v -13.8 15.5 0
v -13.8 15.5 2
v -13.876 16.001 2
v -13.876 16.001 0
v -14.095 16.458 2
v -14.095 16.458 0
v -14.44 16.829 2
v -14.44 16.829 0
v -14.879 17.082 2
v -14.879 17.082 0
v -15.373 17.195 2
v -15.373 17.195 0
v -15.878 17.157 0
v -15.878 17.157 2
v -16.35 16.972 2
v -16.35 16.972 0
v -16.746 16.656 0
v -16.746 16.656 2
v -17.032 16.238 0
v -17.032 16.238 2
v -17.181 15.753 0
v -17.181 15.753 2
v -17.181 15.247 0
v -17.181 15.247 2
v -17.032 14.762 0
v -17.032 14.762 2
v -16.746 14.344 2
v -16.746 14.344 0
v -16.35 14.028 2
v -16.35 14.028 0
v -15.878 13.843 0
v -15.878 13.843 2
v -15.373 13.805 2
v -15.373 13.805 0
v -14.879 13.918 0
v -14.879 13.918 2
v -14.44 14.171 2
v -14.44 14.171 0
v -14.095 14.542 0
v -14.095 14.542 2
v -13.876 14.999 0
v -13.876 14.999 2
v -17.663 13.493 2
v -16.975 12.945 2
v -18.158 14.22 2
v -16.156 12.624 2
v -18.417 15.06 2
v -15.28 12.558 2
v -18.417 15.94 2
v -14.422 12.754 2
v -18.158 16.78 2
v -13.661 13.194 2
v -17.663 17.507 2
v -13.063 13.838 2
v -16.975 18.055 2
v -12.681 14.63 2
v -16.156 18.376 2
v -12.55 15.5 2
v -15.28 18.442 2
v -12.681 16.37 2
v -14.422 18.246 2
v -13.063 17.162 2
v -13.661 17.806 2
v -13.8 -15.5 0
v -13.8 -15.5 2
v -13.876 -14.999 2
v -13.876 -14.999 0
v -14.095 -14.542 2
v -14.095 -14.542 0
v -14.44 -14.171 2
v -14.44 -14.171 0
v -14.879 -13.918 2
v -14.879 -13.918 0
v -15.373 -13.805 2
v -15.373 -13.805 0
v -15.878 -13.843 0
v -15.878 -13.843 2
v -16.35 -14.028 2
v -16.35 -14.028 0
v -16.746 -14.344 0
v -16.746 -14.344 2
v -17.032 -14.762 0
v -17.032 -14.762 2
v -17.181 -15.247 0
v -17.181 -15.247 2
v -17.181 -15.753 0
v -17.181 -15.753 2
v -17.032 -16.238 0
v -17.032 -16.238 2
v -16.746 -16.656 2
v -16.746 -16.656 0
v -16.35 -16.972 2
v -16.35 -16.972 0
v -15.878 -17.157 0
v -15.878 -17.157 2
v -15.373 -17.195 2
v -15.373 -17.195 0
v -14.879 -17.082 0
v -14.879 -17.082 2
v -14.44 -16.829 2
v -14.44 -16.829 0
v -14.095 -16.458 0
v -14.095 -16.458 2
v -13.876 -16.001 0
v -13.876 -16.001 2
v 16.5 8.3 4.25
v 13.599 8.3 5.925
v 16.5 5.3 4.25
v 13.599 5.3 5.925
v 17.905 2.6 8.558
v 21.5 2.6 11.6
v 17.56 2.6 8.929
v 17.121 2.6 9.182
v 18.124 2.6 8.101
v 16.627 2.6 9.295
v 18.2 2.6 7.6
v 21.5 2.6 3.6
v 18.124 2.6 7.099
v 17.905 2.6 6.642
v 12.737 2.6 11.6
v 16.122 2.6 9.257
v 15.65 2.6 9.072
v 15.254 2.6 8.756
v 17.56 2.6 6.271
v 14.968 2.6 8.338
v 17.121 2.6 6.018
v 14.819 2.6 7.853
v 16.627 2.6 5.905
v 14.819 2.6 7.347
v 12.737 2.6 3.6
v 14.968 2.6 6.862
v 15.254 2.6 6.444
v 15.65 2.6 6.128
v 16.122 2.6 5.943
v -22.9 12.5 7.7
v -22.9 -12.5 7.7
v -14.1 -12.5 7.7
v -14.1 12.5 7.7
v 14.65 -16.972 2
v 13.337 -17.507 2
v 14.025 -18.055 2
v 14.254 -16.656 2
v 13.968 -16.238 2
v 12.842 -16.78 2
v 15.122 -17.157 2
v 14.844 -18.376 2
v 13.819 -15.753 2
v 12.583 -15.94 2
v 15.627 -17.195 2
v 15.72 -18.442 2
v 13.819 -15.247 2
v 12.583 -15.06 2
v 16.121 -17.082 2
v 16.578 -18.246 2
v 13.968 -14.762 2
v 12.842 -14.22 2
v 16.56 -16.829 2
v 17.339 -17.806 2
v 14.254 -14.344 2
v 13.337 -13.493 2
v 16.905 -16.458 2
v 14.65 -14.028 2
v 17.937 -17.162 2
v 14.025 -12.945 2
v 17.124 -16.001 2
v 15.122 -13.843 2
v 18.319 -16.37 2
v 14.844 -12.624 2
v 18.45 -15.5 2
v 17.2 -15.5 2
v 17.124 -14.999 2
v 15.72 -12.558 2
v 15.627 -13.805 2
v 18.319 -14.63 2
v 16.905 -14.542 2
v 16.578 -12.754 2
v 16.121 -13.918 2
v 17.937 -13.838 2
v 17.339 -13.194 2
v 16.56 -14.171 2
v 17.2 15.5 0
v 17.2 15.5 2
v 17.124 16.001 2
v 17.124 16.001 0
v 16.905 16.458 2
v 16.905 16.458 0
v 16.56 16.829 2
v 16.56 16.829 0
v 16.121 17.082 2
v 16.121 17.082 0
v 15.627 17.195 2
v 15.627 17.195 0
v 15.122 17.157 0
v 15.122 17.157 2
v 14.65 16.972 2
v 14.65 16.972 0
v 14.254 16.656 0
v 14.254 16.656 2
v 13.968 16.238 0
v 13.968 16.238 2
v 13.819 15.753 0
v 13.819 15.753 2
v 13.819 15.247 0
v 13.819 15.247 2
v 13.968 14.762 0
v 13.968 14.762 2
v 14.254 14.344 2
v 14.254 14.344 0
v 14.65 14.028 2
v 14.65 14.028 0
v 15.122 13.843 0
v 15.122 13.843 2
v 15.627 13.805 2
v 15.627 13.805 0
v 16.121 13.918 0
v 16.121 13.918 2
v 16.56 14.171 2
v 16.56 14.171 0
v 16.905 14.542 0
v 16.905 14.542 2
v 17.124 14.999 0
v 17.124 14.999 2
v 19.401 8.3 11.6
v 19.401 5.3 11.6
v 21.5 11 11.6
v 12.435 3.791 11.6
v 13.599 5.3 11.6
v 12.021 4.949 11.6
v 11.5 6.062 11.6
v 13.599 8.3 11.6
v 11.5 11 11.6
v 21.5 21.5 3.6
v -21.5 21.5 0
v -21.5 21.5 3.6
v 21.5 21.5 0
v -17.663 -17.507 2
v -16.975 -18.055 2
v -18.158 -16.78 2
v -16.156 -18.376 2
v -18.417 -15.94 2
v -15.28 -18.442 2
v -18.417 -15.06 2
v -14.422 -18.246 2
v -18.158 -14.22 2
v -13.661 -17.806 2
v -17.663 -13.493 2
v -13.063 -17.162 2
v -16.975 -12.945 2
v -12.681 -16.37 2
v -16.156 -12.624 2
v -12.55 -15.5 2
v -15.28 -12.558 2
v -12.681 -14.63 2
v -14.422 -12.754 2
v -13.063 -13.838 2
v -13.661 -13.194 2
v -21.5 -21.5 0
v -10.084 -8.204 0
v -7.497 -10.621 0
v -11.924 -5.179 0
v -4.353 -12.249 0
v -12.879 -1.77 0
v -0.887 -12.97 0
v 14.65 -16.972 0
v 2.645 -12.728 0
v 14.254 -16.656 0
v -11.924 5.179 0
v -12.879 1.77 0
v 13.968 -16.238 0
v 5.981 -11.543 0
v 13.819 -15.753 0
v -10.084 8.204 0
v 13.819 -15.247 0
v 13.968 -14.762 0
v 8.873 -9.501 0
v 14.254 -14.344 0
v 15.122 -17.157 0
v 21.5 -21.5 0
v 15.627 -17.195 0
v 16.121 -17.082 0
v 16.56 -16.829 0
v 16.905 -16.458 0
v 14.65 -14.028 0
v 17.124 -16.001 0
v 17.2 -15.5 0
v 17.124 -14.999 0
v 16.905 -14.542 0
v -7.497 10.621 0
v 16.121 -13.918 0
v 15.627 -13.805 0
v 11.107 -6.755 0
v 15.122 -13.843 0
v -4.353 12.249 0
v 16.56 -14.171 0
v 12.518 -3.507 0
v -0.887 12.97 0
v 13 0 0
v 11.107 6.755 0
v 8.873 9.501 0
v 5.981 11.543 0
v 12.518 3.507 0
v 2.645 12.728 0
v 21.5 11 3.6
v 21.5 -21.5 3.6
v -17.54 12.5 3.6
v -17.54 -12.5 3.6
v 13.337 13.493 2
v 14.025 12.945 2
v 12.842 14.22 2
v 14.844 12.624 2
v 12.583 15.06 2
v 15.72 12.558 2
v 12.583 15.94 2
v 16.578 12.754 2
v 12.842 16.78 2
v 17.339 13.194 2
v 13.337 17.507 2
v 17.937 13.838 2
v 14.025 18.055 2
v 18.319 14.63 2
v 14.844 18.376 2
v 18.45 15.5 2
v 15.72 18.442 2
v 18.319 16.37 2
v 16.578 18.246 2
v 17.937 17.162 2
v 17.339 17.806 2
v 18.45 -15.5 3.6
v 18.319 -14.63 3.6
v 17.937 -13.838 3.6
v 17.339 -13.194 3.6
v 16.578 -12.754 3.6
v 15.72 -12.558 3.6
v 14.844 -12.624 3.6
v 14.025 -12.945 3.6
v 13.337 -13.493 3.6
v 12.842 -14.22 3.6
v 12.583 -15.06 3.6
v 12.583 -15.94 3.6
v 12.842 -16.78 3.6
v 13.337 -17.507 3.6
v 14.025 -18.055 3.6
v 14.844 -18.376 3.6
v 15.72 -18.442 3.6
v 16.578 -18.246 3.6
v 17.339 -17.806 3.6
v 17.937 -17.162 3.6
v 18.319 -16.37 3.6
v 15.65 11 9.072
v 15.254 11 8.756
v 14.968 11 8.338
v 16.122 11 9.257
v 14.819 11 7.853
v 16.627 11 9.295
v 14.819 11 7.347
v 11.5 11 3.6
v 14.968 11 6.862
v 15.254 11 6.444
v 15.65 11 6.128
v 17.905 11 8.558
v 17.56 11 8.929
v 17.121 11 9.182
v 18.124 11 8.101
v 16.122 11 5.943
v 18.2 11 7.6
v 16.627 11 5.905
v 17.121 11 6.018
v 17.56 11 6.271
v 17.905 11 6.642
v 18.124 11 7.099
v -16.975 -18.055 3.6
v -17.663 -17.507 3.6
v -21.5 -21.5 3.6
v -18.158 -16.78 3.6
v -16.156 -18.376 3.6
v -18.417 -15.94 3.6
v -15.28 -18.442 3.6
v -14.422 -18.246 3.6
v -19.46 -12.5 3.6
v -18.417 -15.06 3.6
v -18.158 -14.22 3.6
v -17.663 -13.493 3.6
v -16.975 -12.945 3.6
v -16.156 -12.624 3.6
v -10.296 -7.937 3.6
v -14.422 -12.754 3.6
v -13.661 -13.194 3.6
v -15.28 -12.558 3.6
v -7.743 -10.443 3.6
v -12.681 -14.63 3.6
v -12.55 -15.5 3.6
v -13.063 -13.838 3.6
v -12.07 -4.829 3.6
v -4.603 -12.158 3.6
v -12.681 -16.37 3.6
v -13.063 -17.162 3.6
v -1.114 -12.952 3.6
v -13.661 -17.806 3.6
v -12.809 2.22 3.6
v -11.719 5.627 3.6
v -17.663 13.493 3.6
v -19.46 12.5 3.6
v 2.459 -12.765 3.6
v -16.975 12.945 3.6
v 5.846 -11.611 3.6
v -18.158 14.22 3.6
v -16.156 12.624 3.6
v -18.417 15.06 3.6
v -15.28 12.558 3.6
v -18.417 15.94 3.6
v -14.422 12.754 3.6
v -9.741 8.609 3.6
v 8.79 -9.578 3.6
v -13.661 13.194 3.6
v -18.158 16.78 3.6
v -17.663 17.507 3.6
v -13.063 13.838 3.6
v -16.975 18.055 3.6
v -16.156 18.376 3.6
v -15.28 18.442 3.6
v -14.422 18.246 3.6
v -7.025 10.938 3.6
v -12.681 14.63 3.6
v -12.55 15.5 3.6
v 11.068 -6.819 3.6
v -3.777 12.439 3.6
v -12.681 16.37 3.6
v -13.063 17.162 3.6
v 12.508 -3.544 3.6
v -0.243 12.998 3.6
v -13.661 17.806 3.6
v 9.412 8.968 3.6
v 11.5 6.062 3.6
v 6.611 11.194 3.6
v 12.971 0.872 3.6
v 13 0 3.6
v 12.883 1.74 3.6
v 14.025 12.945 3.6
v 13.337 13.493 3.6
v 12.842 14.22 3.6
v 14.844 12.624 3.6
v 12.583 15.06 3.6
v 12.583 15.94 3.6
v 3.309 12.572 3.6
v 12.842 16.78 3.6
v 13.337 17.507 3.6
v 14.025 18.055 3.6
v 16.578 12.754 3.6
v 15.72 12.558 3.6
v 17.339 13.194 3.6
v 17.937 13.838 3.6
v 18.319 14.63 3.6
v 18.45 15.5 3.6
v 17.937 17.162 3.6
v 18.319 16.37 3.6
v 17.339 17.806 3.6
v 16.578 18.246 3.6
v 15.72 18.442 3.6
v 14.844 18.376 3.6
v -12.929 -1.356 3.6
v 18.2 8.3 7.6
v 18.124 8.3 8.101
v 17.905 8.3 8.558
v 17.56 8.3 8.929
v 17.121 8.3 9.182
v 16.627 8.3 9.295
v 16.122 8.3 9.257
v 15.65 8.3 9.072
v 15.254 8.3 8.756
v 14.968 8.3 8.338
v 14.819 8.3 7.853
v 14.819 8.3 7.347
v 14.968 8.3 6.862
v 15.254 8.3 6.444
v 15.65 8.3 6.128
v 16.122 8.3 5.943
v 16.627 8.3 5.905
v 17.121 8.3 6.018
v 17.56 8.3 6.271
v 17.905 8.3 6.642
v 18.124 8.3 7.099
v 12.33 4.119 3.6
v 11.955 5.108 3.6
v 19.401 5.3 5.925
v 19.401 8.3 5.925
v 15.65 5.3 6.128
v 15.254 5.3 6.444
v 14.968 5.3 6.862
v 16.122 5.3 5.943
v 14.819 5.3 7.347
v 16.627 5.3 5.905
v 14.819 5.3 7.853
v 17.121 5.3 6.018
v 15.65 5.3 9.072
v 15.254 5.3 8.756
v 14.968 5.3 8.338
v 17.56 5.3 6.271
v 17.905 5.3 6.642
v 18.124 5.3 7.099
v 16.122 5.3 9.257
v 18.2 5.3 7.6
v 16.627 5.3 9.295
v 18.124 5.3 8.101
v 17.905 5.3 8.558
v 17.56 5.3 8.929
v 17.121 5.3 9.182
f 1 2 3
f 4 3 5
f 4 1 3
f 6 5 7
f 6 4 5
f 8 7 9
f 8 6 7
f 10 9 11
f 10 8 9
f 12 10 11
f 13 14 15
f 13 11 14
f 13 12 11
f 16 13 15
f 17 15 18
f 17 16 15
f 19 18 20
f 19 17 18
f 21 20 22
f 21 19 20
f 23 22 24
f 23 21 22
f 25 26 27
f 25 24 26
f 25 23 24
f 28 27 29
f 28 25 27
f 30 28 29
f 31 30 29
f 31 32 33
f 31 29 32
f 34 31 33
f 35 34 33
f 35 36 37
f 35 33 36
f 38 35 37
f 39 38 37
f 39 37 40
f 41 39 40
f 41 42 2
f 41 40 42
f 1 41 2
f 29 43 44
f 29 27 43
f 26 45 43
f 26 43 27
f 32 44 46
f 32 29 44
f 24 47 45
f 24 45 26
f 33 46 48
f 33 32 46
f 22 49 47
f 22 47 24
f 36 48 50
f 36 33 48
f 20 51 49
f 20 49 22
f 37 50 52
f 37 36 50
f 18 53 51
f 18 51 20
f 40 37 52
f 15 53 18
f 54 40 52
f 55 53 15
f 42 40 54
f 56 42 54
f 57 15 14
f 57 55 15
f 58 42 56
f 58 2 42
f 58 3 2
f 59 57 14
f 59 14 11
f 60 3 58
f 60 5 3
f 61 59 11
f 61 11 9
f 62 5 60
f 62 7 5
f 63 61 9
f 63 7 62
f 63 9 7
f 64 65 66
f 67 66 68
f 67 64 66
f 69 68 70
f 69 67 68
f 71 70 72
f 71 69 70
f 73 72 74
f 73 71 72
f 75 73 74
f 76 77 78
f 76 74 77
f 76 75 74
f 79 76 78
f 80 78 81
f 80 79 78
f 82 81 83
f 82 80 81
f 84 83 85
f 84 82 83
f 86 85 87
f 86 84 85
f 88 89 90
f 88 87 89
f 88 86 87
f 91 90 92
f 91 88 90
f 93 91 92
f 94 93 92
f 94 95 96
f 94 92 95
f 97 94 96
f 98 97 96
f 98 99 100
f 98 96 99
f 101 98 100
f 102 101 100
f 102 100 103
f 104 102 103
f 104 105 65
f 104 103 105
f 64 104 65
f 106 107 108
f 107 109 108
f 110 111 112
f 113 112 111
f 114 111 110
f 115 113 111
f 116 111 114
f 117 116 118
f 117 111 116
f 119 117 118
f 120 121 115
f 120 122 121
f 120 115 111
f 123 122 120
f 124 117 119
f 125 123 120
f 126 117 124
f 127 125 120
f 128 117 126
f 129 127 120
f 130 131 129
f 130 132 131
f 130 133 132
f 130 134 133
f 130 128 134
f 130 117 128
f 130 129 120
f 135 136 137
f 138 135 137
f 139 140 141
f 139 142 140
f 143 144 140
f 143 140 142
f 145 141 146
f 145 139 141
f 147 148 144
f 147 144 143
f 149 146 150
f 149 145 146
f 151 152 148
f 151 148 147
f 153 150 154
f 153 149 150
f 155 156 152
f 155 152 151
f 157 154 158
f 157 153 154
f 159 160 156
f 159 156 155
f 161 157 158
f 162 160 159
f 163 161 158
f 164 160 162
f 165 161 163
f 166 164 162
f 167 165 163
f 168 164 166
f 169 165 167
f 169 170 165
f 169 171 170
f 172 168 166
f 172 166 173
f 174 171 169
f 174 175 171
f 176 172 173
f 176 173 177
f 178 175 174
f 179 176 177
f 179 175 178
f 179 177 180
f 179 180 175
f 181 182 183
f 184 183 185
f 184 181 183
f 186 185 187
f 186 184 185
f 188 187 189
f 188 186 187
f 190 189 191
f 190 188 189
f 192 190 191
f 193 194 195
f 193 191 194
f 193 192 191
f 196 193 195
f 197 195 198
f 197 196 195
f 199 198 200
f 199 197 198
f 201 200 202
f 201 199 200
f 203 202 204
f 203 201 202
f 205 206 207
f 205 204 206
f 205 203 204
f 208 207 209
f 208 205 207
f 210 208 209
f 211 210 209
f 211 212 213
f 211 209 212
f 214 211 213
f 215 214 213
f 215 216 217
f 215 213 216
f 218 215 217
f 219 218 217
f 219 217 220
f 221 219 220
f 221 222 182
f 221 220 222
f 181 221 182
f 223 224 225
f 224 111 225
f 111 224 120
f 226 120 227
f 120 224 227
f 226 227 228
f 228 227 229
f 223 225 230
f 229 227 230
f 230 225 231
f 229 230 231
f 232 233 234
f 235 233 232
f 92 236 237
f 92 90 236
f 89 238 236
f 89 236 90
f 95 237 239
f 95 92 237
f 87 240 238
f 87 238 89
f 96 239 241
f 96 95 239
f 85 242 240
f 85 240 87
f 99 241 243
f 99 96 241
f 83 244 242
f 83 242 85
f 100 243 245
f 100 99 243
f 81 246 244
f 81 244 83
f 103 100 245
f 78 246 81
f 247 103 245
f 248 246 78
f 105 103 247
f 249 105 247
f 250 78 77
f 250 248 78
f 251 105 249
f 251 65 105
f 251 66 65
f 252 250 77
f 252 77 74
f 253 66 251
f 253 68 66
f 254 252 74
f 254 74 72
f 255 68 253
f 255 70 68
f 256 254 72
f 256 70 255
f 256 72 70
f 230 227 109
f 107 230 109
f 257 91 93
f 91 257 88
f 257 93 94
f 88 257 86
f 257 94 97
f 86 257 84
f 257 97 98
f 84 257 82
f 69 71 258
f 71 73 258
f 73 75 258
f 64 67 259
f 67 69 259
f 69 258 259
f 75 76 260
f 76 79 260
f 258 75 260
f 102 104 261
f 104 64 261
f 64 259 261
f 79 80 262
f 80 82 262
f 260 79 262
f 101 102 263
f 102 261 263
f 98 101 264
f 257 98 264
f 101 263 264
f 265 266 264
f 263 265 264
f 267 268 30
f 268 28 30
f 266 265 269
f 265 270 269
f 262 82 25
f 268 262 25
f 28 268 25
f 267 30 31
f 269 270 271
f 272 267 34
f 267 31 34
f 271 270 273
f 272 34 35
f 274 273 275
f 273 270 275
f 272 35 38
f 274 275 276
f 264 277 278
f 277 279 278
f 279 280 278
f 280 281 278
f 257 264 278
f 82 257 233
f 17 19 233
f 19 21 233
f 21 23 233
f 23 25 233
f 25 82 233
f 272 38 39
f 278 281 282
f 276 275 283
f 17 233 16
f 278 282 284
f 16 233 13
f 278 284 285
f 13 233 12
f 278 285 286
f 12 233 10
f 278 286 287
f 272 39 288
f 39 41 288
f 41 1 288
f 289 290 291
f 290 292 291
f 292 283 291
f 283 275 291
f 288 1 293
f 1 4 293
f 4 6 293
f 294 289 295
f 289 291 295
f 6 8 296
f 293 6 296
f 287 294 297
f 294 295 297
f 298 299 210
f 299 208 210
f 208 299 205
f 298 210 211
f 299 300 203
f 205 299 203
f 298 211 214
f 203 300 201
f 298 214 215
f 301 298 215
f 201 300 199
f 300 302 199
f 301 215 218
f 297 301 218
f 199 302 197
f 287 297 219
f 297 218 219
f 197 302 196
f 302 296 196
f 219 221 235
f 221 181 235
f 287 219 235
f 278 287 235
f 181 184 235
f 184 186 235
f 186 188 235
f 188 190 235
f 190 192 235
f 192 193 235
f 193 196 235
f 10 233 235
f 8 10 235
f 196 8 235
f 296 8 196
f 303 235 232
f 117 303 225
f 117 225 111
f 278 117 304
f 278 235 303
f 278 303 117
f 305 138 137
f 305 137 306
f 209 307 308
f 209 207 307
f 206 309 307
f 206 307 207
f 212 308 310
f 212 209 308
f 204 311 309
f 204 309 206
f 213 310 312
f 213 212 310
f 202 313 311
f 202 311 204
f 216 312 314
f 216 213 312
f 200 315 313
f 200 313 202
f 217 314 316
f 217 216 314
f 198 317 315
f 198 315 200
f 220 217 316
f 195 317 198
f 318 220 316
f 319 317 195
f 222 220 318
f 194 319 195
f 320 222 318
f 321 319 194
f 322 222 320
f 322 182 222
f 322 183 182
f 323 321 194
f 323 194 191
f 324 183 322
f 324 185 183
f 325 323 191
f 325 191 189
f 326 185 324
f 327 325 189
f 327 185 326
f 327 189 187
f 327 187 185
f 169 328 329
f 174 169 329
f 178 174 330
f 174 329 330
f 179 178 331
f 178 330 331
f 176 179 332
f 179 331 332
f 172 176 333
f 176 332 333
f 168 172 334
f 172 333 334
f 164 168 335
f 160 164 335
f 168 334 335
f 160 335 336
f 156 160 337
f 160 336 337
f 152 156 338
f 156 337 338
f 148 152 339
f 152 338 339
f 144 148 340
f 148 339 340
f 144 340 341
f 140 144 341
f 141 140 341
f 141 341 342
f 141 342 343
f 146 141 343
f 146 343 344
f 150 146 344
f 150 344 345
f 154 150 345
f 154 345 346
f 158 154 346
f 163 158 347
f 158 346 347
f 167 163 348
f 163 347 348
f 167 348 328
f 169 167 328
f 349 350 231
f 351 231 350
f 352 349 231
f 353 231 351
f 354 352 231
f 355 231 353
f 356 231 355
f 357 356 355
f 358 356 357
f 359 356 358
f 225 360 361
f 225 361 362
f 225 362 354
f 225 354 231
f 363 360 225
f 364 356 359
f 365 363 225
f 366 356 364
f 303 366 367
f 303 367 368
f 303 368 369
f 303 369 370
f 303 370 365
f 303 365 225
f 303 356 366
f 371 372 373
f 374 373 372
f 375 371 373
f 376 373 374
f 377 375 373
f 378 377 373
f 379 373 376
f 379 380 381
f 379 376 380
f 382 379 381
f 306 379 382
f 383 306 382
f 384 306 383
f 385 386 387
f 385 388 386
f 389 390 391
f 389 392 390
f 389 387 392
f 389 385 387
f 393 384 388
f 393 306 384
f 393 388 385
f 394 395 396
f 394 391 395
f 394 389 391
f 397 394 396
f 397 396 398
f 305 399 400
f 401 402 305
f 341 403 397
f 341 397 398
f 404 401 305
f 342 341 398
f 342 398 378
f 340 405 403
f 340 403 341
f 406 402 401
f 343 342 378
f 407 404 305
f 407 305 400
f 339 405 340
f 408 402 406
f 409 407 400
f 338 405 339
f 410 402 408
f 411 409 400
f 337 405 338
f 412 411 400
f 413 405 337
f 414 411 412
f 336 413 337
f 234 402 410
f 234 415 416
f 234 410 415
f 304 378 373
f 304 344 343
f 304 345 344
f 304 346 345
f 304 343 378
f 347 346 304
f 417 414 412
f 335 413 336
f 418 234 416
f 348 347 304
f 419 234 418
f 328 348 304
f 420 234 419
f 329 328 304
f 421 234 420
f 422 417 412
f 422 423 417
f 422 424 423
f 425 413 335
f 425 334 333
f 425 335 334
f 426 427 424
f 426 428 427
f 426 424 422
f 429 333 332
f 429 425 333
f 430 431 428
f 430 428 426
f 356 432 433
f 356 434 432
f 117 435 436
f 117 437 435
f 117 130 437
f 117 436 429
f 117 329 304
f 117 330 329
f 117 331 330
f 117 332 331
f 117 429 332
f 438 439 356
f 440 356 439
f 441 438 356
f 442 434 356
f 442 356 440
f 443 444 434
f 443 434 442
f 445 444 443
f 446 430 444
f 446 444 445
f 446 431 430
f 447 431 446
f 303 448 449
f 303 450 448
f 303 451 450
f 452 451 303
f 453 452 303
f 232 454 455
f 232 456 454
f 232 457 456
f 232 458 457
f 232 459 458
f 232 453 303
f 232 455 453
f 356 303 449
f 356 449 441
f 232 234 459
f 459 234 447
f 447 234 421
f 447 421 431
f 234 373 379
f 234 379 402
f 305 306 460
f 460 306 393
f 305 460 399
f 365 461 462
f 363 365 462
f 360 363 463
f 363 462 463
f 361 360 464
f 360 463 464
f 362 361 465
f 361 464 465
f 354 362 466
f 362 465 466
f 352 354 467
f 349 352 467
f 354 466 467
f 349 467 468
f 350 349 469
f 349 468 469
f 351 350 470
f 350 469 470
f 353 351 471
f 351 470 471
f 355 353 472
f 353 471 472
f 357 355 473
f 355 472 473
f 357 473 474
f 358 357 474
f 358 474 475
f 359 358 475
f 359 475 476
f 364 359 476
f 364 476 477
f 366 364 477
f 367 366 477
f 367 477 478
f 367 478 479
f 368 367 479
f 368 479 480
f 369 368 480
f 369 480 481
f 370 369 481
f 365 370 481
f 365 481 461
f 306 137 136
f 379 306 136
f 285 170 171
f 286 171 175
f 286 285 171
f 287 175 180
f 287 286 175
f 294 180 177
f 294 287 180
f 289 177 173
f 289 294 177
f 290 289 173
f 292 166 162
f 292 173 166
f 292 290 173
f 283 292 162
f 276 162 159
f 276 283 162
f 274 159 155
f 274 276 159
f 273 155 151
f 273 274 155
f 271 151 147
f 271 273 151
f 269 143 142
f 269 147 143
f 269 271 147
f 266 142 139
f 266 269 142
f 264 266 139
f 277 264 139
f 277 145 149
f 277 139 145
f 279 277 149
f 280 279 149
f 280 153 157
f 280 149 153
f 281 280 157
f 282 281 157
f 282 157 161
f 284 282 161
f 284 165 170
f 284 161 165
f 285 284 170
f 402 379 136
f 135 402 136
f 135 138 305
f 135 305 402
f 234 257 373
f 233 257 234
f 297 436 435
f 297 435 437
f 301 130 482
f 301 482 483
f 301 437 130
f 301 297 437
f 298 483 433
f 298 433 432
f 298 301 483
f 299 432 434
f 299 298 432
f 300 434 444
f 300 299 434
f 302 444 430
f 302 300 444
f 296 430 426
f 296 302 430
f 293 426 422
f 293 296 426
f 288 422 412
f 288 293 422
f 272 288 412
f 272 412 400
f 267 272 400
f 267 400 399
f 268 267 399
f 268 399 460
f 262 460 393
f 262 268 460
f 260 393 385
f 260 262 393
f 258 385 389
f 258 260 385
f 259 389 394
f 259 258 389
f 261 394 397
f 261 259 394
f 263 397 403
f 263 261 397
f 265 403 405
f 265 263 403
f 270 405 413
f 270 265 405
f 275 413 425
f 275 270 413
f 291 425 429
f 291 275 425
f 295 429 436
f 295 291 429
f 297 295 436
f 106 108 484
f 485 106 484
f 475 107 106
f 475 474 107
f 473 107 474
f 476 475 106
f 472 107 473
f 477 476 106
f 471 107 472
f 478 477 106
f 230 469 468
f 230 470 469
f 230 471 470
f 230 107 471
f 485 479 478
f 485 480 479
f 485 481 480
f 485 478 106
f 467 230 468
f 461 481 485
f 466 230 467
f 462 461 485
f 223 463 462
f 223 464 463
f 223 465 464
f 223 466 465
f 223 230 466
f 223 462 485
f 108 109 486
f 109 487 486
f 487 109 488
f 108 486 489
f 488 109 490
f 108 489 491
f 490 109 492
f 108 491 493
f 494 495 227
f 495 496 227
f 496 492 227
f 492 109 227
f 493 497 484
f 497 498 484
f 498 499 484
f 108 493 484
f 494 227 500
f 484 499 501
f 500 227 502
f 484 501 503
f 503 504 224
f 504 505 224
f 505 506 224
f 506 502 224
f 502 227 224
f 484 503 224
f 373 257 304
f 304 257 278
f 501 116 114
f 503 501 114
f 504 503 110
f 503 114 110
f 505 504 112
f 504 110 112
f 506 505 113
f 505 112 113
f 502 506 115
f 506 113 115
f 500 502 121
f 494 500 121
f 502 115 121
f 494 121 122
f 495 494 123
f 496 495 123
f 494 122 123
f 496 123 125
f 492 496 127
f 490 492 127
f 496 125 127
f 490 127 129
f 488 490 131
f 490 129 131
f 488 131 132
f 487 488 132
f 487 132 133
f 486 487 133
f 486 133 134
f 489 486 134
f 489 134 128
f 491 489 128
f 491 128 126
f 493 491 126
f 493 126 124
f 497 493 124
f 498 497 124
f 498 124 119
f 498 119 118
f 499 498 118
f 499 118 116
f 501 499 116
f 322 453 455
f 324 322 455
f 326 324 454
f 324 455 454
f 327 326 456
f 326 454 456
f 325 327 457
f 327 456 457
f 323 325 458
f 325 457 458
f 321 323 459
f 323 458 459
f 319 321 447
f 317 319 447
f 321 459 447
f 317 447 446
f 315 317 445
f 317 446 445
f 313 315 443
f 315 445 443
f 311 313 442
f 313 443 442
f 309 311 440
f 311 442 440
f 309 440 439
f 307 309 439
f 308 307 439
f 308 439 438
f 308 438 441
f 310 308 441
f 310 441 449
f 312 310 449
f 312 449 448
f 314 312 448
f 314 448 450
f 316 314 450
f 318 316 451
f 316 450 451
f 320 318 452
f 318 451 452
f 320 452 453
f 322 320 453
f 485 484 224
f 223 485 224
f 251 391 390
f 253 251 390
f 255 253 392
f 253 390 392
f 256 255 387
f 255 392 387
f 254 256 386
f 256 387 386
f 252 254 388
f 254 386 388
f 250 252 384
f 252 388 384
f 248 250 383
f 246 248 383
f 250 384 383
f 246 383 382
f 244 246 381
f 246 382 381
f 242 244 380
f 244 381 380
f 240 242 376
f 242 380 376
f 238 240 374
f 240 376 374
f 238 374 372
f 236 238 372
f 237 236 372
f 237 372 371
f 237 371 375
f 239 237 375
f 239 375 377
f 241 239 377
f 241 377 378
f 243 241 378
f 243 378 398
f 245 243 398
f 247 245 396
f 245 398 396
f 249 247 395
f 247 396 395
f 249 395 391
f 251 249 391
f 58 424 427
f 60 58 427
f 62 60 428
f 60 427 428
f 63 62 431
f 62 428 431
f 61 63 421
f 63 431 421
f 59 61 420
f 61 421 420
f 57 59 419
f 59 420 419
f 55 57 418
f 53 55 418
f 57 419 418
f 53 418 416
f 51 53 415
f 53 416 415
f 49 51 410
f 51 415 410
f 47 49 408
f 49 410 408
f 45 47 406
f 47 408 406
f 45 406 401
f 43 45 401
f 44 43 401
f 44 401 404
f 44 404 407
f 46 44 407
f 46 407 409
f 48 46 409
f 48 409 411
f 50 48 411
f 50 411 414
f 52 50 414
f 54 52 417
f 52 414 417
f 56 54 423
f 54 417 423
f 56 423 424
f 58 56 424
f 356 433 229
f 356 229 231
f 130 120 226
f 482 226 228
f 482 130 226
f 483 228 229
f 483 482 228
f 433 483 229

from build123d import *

# Parameters (mm, degrees)
SKETCH_W        = 43
SKETCH_H        = 43
SKETCH_R        = 13
SKETCH_R_2      = 1.7
PAD_DEPTH       = 3.6
SKETCH001_R     = 2.95
POCKET_DEPTH    = 1.6
PAD001_DEPTH    = 8
SKETCH003_R     = 1.7
POCKET001_DEPTH = 18.901
POCKET002_DEPTH = 1.5
PAD002_DEPTH    = 12.5


with BuildPart() as part:
    # Sketch → Pad (new body)
    with BuildSketch(Plane.XY):
        Rectangle(SKETCH_W, SKETCH_H)
        Circle(SKETCH_R, mode=Mode.SUBTRACT)
        with Locations((-15.5, 15.5)):
            Circle(SKETCH_R_2, mode=Mode.SUBTRACT)
        with Locations((15.5, 15.5)):
            Circle(SKETCH_R_2, mode=Mode.SUBTRACT)
        with Locations((15.5, -15.5)):
            Circle(SKETCH_R_2, mode=Mode.SUBTRACT)
        with Locations((-15.5, -15.5)):
            Circle(SKETCH_R_2, mode=Mode.SUBTRACT)
    extrude(amount=PAD_DEPTH)

    # Sketch001 (on Face11 of Pad) → Pocket (cut)
    with BuildSketch(Plane.XY.offset(3.6)):
        with Locations((15.5, 15.5)):
            Circle(SKETCH001_R)
        with Locations((-15.5, 15.5)):
            Circle(SKETCH001_R)
        with Locations((-15.5, -15.5)):
            Circle(SKETCH001_R)
        with Locations((15.5, -15.5)):
            Circle(SKETCH001_R)
    extrude(amount=-POCKET_DEPTH, mode=Mode.SUBTRACT)

    # Sketch002 (on Face5 of Pocket) → Pad001 (join)
    with BuildSketch(Plane.XY.offset(3.6)):
        with BuildLine():
            ThreePointArc((12.737347, 2.6), (12.241687, 4.375053), (11.5, 6.062178))
            Line((11.5, 6.062178), (11.5, 11))
            Line((11.5, 11), (21.5, 11))
            Line((21.5, 11), (21.5, 2.6))
            Line((21.5, 2.6), (12.737347, 2.6))
        make_face()
    extrude(amount=PAD001_DEPTH)

    # Sketch003 (on Face10 of Pad001) → Pocket001 (cut, through all)
    with BuildSketch(Plane.XZ.offset(-2.6)):
        with Locations((16.5, 7.6)):
            Circle(SKETCH003_R)
    extrude(amount=-POCKET001_DEPTH, mode=Mode.SUBTRACT)

    # Sketch004 (on DatumPlane) → Pocket002 (cut, symmetric)
    with BuildSketch(Plane.XZ.offset(-6.8)):
        Polygon((13.598815, 5.925), (16.5, 4.25), (19.401185, 5.925), (19.401185, 15.925), (13.598815, 15.925), align=None)
    extrude(amount=POCKET002_DEPTH, both=True, mode=Mode.SUBTRACT)

    # Sketch005 → Pad002 (join, symmetric)
    with BuildSketch(Plane.XZ):
        Polygon((-22.9, 7.7), (-14.1, 7.7), (-18.5, 2.456284), align=None)
    extrude(amount=PAD002_DEPTH, both=True)


solid = part.part
